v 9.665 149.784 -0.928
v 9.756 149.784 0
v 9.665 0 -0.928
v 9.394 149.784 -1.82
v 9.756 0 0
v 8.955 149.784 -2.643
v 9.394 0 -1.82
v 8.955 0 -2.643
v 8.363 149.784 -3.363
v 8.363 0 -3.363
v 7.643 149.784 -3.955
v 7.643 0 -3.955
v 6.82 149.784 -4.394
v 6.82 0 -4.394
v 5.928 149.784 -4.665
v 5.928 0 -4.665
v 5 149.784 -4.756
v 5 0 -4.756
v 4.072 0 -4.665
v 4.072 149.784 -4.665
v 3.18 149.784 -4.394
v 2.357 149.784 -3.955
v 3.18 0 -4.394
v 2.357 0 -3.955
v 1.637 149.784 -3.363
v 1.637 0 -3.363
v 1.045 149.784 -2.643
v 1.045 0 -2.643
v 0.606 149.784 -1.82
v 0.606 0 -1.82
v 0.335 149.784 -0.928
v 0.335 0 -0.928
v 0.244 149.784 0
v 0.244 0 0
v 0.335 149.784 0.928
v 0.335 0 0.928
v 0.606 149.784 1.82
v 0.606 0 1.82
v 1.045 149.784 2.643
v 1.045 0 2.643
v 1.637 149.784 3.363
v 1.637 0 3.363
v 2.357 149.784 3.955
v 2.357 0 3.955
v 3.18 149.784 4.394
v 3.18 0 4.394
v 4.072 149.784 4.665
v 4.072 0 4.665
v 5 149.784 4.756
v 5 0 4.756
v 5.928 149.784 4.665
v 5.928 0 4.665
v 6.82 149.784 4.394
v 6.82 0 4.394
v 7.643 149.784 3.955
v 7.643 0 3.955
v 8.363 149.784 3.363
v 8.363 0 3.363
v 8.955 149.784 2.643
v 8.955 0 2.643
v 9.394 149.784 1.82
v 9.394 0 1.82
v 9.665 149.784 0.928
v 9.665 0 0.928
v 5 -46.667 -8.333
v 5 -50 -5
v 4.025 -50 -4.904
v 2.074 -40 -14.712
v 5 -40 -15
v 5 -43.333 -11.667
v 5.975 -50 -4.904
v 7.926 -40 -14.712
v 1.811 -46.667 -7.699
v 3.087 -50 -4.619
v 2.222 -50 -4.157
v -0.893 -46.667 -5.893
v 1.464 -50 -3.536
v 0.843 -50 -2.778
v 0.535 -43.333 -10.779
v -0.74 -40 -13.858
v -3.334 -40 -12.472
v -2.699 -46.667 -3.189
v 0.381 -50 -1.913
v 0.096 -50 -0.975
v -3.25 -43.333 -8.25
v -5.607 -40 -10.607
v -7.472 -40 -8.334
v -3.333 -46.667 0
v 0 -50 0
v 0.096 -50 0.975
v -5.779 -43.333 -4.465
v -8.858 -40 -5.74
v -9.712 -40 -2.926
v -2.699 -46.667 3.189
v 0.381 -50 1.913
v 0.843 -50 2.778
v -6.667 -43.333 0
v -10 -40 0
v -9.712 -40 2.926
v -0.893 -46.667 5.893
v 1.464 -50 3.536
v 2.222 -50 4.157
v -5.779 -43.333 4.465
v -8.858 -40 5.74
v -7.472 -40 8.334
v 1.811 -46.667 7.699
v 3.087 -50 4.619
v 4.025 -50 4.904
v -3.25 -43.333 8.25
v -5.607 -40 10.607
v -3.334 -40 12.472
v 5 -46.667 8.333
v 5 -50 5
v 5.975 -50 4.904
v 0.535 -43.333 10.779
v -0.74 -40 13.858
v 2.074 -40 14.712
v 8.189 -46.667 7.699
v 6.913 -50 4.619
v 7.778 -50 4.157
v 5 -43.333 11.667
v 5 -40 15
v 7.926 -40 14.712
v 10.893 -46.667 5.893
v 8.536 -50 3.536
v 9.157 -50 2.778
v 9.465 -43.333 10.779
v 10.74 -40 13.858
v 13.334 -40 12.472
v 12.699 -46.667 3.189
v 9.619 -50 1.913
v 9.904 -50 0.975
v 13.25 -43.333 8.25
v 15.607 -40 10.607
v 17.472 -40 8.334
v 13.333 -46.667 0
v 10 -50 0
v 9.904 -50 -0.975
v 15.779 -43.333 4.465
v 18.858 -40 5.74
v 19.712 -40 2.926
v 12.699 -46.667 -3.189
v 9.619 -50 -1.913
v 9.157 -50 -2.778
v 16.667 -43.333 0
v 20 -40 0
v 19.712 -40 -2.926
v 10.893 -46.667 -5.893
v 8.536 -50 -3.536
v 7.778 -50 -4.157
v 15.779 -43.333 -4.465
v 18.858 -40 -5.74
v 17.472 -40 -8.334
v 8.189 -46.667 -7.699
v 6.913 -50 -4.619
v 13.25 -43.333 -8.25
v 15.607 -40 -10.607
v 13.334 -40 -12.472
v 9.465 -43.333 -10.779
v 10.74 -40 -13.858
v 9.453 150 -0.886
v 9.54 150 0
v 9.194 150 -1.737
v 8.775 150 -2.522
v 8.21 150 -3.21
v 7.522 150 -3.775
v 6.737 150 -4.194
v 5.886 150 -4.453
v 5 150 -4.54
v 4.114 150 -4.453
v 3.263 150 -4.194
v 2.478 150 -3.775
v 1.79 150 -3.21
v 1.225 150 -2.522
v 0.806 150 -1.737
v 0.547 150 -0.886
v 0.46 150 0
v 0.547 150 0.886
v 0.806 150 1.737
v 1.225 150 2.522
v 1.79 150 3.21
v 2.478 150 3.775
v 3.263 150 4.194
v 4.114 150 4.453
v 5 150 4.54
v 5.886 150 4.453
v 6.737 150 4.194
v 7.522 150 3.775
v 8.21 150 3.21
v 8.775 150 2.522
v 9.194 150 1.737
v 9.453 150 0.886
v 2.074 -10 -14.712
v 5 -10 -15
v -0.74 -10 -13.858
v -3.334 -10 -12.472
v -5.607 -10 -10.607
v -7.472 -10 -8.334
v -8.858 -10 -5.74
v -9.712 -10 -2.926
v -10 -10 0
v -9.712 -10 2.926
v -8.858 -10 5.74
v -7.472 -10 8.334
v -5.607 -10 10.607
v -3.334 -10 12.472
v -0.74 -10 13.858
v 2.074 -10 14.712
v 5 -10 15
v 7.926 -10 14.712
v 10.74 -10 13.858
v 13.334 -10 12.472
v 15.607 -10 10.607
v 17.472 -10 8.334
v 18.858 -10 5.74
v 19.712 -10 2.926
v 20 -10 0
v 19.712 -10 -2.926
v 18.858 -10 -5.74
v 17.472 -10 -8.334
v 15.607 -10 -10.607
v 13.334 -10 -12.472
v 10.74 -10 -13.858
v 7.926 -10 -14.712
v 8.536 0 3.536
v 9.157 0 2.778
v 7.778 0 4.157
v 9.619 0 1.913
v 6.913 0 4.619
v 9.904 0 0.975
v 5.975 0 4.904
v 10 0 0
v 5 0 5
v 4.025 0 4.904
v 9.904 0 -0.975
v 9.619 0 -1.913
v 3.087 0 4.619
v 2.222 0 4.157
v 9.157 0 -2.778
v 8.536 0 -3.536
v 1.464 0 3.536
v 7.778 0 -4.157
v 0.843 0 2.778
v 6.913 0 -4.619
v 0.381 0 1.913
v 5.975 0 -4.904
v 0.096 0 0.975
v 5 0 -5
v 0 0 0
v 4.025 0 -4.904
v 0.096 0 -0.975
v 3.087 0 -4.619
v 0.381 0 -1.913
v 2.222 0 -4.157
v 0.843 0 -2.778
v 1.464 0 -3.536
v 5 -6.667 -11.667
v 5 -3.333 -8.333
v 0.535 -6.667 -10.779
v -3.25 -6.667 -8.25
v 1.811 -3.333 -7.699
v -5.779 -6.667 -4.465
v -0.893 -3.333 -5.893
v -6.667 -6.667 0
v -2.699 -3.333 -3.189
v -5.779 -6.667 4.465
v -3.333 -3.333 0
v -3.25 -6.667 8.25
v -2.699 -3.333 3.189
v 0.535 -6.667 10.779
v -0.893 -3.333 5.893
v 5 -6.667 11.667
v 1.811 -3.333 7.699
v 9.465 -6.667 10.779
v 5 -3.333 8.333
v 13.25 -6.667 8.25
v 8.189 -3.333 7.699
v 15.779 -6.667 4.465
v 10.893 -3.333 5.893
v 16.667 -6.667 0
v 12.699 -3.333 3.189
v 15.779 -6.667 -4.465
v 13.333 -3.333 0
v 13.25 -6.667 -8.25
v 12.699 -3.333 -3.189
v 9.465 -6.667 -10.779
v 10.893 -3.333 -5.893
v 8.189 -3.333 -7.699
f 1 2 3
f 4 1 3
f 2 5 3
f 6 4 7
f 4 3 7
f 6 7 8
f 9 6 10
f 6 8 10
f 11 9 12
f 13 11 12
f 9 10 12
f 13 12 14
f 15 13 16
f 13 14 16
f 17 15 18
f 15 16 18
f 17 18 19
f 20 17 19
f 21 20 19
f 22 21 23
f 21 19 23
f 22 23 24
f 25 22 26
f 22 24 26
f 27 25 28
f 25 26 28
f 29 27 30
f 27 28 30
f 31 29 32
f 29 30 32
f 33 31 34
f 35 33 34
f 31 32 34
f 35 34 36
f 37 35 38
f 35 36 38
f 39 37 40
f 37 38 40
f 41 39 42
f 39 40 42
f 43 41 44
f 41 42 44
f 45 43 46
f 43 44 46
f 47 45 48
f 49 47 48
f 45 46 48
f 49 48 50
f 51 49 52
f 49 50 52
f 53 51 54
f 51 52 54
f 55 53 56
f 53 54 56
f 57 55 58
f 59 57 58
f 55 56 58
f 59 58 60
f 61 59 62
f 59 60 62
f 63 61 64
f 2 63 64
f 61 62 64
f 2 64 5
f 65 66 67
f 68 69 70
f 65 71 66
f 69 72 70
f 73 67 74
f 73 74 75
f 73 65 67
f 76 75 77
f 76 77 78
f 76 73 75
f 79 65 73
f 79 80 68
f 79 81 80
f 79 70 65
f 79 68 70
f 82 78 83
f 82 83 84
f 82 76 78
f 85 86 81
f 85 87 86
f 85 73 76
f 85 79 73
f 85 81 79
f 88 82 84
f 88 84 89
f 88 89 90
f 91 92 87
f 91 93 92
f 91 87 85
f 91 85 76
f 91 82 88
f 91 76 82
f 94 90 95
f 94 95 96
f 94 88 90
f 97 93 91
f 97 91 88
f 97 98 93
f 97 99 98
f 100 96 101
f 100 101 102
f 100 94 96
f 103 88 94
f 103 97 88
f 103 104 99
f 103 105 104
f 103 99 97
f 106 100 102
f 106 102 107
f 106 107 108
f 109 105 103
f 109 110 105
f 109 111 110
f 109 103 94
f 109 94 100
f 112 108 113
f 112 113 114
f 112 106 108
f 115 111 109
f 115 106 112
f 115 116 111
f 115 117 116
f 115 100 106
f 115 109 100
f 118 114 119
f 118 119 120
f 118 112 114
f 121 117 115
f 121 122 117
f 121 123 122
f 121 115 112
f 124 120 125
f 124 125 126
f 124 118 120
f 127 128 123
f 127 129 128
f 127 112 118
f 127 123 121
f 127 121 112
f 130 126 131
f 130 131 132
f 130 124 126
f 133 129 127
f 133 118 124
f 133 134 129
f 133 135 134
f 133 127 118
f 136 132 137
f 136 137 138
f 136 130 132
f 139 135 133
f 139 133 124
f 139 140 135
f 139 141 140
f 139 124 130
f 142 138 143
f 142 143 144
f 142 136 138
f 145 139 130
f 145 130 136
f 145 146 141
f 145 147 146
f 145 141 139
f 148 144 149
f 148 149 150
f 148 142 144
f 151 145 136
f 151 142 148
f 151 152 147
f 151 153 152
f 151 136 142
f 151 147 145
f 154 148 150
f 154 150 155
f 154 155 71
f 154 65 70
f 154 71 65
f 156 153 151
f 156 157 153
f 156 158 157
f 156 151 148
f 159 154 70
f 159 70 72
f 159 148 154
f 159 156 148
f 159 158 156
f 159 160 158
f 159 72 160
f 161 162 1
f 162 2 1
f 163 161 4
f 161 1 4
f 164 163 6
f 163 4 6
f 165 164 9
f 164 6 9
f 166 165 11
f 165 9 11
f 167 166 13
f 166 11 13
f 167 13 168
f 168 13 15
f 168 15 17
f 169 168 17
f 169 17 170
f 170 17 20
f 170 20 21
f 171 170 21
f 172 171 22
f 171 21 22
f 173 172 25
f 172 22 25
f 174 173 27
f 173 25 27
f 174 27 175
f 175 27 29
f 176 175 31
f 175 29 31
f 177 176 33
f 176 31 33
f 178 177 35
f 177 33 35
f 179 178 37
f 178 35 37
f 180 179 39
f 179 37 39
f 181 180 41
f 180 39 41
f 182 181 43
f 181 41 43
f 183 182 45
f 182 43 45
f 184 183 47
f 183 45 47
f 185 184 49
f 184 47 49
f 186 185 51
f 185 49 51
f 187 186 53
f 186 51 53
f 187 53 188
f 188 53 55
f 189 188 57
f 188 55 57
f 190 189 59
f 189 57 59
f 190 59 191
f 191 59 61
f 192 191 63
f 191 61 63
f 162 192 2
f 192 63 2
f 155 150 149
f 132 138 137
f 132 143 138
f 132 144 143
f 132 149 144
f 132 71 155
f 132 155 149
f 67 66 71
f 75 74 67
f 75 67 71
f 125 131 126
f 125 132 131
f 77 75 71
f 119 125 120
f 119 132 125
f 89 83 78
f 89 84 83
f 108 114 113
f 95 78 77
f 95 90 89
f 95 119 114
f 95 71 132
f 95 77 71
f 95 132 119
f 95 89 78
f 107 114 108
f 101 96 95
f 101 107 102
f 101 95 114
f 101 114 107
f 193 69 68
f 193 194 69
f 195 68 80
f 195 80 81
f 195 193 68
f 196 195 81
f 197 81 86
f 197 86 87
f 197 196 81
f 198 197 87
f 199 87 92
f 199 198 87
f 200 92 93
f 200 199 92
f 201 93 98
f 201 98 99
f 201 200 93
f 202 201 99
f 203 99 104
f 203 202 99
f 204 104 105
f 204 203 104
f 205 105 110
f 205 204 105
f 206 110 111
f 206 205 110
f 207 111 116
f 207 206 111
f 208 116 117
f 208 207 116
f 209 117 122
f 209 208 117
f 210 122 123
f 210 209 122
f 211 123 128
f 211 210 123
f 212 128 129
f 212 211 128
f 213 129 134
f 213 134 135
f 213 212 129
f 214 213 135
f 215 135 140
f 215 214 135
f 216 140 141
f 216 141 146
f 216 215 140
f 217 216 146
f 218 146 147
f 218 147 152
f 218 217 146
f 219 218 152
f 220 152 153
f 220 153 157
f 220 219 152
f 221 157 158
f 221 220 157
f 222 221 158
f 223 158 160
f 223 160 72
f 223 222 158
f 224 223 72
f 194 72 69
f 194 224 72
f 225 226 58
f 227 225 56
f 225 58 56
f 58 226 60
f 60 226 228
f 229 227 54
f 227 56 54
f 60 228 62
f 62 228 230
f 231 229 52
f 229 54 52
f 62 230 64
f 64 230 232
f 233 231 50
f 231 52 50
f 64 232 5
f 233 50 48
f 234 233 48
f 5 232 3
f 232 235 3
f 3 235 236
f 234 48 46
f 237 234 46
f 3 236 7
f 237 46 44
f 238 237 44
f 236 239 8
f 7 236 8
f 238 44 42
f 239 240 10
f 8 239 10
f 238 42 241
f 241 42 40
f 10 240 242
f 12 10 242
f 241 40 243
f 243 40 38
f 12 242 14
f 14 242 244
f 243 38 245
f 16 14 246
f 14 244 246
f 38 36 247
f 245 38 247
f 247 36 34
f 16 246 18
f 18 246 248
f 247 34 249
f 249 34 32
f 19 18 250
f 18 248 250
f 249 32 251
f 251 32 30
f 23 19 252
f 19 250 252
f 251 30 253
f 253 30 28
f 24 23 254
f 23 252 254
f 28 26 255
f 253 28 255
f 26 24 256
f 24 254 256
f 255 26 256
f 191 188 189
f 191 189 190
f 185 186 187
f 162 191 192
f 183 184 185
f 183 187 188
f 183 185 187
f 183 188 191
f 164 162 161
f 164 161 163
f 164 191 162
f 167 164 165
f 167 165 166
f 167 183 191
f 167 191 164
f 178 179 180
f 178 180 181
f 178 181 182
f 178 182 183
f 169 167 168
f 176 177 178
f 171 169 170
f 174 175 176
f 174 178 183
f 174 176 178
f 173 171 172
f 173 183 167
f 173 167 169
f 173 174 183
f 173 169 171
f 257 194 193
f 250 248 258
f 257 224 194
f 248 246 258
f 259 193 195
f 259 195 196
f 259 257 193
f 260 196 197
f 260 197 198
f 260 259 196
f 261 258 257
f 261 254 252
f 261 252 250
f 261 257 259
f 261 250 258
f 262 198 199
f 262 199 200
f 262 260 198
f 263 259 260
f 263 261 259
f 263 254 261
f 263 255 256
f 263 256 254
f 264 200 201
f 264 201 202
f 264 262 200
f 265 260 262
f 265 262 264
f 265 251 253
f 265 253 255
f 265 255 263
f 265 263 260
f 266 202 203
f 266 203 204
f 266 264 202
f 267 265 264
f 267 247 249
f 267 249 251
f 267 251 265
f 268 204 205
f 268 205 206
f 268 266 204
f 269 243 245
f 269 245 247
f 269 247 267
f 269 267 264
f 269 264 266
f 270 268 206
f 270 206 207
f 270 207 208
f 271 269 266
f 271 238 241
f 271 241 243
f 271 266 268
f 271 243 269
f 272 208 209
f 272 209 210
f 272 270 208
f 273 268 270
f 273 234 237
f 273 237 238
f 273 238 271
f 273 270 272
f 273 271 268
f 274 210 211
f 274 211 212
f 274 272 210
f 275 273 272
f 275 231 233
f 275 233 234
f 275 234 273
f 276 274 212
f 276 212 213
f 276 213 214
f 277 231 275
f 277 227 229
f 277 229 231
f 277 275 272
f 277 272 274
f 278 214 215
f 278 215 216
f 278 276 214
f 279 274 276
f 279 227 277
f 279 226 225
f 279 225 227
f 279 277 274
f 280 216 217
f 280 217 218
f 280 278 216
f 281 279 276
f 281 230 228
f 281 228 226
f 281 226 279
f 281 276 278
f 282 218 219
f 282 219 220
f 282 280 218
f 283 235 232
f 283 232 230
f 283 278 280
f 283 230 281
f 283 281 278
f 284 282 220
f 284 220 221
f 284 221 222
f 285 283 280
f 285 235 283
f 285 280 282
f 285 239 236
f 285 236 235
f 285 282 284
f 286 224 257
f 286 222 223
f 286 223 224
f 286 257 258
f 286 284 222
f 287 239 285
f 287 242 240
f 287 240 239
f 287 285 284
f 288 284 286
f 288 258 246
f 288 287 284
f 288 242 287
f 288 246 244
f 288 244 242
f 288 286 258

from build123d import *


# Read off the part's stored shape, not the designer's step: M10x0.75 Machine Threads Stud1
with BuildPart() as part:
    # Sketch1 → Revolve2 (revolve)
    with BuildSketch(Plane.XY, mode=Mode.PRIVATE) as revolve2_sk:
        Polygon((0, 0), (0, 150), (5, 150), (5, -50), (0, -50), (-10, -40), (-10, -10), align=None)
    revolve(revolve2_sk.sketch.rotate(Axis((5, 0, 0), (0, 1, 0)), 270), axis=Axis((5, 0, 0), (0, 1, 0)))

    # M10x0.75 Machine Threads Stud1 outline → M10x0.75 Machine Threads Stud1 (revolve, cut)
    with BuildSketch(Plane(origin=(5, 0, 0), x_dir=(1, 0, 0), z_dir=(0, 0, 1))):
        Polygon((5, 150), (4.54, 150), (4.7565, 149.7835), (4.7565, 0), (5, 0), align=None)
    revolve(axis=Axis((5, 0, 0), (0, 1, 0)), mode=Mode.SUBTRACT)


solid = part.part
